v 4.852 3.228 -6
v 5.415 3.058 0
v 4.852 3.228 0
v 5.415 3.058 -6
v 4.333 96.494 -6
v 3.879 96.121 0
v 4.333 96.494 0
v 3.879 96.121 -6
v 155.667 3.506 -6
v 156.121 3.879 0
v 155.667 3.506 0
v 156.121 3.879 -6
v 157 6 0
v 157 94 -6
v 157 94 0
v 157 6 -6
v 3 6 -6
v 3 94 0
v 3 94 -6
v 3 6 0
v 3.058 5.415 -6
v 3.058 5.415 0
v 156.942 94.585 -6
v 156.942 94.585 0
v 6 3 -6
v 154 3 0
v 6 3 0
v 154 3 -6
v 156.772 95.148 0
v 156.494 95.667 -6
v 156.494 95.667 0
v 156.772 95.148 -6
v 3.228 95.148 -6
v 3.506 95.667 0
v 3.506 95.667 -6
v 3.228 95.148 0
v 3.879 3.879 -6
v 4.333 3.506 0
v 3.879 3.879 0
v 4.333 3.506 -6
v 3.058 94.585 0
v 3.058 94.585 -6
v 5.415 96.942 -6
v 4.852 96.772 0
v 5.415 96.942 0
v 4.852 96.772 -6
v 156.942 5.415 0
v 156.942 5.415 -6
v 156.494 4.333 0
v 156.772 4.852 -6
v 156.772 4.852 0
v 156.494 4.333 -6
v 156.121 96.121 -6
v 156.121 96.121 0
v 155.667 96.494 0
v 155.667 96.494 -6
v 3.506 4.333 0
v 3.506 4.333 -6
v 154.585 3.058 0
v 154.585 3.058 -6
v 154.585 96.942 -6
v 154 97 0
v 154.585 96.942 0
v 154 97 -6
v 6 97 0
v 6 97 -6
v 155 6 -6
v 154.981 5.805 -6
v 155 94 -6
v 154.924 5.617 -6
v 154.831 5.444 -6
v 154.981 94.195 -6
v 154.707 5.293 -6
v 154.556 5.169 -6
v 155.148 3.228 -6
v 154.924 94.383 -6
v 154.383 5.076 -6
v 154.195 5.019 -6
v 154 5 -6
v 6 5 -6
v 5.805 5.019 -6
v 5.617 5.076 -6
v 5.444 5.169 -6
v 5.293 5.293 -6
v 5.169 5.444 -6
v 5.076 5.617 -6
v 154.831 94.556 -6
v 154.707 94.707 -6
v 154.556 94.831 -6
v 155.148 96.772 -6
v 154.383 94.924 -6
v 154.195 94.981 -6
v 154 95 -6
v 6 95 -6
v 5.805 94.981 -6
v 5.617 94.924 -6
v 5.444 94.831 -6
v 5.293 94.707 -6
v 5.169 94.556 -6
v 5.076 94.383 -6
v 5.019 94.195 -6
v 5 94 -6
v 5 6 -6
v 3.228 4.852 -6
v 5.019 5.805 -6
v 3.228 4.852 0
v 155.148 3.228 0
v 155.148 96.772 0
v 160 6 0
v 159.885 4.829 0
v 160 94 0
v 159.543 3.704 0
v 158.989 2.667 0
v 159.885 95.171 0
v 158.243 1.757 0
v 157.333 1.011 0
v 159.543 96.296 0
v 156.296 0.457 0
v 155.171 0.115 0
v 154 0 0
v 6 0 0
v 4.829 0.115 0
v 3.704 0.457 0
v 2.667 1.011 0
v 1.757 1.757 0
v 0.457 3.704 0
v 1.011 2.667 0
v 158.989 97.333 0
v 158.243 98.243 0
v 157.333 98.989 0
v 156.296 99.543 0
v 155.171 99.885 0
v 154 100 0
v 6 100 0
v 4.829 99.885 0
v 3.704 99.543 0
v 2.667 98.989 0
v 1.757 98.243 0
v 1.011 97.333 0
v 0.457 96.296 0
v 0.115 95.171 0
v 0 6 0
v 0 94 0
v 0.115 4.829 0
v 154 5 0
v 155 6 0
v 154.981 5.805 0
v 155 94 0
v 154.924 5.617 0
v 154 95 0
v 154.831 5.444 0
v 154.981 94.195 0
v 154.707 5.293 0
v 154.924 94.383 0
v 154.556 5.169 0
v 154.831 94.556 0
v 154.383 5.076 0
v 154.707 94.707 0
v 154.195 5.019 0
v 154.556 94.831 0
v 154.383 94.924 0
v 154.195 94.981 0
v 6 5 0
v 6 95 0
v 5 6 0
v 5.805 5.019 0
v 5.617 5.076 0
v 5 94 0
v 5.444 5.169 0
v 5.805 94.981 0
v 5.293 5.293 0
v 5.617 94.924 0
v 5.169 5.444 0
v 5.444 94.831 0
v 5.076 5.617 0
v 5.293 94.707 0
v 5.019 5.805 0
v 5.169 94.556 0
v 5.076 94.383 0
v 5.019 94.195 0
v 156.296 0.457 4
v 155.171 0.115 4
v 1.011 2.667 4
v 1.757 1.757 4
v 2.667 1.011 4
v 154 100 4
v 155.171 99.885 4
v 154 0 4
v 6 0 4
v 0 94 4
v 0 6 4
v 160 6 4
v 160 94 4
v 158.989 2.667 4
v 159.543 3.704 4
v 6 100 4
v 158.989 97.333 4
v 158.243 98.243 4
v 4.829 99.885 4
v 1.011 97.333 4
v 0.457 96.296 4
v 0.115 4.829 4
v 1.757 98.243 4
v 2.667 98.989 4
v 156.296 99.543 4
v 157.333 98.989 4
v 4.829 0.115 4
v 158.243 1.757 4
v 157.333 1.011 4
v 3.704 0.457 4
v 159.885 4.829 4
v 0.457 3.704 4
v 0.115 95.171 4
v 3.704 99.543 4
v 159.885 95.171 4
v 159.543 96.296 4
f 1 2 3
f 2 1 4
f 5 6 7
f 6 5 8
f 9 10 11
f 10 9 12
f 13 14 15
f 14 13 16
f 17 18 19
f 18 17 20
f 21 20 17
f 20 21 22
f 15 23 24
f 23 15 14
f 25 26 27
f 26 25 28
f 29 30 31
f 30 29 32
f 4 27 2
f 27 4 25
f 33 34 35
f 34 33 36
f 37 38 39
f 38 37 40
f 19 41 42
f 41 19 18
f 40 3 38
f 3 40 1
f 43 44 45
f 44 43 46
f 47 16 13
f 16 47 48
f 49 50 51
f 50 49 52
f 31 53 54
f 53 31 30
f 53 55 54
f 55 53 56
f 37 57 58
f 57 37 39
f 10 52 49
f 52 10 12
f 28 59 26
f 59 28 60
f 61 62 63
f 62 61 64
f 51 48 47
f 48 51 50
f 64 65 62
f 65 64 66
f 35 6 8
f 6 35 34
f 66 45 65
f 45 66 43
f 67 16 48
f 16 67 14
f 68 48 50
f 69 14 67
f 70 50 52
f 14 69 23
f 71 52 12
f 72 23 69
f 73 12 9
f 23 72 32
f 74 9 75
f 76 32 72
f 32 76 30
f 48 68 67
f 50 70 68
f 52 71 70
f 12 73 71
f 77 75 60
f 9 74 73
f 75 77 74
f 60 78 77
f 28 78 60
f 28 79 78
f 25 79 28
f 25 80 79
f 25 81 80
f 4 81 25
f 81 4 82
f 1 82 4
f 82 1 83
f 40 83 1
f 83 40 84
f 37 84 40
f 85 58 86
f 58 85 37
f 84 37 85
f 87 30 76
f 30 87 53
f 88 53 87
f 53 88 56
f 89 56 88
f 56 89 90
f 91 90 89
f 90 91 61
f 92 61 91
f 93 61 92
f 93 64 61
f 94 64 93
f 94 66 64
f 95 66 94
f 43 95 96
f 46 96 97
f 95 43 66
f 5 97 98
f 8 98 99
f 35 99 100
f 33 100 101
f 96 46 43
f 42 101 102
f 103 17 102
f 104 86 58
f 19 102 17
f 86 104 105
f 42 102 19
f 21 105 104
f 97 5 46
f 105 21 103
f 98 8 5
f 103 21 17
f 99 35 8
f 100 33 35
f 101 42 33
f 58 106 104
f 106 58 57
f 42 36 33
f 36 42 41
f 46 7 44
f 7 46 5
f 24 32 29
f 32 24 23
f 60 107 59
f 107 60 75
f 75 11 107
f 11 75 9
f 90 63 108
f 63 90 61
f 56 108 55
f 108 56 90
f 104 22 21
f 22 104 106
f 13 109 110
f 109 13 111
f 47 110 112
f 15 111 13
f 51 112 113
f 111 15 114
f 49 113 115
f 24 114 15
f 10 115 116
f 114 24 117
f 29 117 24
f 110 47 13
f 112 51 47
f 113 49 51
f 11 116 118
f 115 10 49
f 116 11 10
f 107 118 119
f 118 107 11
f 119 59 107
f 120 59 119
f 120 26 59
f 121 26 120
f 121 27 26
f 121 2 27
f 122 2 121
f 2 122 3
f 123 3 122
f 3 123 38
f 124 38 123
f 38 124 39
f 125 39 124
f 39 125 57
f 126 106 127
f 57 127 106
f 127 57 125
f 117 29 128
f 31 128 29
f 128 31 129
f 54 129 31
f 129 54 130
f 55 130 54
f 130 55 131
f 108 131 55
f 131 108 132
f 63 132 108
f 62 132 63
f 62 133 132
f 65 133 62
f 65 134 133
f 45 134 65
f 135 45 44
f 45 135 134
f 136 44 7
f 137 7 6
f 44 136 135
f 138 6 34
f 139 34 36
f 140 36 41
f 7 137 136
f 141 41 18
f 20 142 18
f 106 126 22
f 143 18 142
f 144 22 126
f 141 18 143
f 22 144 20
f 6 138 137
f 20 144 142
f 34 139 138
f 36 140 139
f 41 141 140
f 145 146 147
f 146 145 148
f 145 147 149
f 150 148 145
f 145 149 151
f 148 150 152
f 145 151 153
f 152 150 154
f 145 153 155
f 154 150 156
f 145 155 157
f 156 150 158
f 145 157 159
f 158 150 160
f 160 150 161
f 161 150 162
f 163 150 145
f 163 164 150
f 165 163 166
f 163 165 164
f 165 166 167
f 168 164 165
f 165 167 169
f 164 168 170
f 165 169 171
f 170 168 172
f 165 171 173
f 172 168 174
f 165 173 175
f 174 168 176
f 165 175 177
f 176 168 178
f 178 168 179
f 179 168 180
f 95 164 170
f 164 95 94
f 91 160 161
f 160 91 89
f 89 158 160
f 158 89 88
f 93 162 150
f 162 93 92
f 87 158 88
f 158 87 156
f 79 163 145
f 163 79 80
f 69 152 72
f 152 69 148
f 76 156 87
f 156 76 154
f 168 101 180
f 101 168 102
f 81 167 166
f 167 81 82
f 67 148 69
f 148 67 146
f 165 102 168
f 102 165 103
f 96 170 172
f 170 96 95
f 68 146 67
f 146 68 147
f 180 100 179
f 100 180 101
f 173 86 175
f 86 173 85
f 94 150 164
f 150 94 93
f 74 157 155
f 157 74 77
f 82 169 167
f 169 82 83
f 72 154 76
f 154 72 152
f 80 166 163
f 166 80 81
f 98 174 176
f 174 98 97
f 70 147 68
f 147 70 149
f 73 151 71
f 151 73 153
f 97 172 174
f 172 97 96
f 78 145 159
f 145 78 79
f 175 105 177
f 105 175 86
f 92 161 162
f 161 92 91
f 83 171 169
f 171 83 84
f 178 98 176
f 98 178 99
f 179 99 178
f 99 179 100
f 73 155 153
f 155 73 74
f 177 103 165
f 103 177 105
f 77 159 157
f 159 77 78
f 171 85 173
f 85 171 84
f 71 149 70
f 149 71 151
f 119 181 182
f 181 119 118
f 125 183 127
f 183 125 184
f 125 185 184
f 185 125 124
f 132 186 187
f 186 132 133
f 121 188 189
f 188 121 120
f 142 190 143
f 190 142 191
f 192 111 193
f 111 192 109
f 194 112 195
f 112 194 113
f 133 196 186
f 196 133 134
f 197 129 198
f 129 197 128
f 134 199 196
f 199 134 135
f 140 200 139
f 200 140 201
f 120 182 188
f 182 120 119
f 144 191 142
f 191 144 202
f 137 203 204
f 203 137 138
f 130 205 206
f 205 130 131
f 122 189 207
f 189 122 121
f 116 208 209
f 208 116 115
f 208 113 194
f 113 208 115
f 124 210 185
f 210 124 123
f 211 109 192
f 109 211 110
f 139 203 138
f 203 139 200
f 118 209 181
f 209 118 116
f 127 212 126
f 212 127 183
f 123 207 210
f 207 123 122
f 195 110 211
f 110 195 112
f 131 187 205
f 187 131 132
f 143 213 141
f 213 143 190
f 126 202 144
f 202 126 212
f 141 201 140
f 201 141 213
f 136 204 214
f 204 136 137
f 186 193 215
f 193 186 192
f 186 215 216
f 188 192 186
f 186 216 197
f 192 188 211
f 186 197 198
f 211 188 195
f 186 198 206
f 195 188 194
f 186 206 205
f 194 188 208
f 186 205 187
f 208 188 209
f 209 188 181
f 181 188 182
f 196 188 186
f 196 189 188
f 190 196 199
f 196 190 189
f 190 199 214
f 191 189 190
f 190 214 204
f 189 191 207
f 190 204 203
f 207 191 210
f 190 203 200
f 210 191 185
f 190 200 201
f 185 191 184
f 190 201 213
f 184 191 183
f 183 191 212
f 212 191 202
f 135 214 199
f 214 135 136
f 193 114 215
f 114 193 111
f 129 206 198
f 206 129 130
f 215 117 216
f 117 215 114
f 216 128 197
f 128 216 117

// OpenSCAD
// lid_panel.scad
// Main panel for a labeled storage-bin lid example (assembly part 1 of 3:
// lid panel + raised label text + pull tab). Hand-authored for the
// ai-3d-factory examples/ library (examples/storage-bin-lid/) - no
// built-in `factory generate-openscad` template covers a bin-lid shape
// yet (the built-in templates are test-cube/nameplate/sign/
// multipart-nameplate - see factory/openscad/templates.py). Keep
// lid_width/lid_depth/lid_height in sync with raised_label.scad and
// pull_tab.scad - all three parts share the same (0,0,0) origin and must
// be imported into the slicer without re-centering any of them. See
// docs/slicer-review-workflow.md.
//
// This repo does not run OpenSCAD automatically. Geometry sanity check
// passed does not mean print-ready - human slicer review is still
// required. See AGENT.md.

// ---- Shared parameters (all in millimeters) - keep in sync with raised_label.scad and pull_tab.scad ----
lid_width = 160;
lid_depth = 100;
lid_height = 4;

// ---- Lid-only parameters ----
corner_radius = 6;          // set to 0 for square corners
lip_wall_thickness = 2;     // friction-fit lip wall thickness
lip_height = 6;              // how far the lip extends down into the bin opening
lip_inset = 3;               // gap between the lid's outer edge and the lip, for a snug (not tight) friction fit

module rounded_rect(width, depth, radius, height) {
    if (radius > 0) {
        hull() {
            for (x = [radius, width - radius])
                for (y = [radius, depth - radius])
                    translate([x, y, 0])
                        cylinder(r = radius, h = height, $fn = 32);
        }
    } else {
        cube([width, depth, height]);
    }
}

// A downward-facing lip ring, inset from the lid's outer edge, sized to
// friction-fit inside a storage bin's top opening - like a picture
// frame's backing ring, not a solid plug.
module friction_fit_lip() {
    inner_width = lid_width - 2 * lip_inset;
    inner_depth = lid_depth - 2 * lip_inset;
    inner_radius = max(corner_radius - lip_inset, 0);
    translate([lip_inset, lip_inset, -lip_height])
        difference() {
            rounded_rect(inner_width, inner_depth, inner_radius, lip_height);
            translate([lip_wall_thickness, lip_wall_thickness, -1])
                rounded_rect(
                    inner_width - 2 * lip_wall_thickness,
                    inner_depth - 2 * lip_wall_thickness,
                    max(inner_radius - lip_wall_thickness, 0),
                    lip_height + 2
                );
        }
}

union() {
    rounded_rect(lid_width, lid_depth, corner_radius, lid_height);
    friction_fit_lip();
}
